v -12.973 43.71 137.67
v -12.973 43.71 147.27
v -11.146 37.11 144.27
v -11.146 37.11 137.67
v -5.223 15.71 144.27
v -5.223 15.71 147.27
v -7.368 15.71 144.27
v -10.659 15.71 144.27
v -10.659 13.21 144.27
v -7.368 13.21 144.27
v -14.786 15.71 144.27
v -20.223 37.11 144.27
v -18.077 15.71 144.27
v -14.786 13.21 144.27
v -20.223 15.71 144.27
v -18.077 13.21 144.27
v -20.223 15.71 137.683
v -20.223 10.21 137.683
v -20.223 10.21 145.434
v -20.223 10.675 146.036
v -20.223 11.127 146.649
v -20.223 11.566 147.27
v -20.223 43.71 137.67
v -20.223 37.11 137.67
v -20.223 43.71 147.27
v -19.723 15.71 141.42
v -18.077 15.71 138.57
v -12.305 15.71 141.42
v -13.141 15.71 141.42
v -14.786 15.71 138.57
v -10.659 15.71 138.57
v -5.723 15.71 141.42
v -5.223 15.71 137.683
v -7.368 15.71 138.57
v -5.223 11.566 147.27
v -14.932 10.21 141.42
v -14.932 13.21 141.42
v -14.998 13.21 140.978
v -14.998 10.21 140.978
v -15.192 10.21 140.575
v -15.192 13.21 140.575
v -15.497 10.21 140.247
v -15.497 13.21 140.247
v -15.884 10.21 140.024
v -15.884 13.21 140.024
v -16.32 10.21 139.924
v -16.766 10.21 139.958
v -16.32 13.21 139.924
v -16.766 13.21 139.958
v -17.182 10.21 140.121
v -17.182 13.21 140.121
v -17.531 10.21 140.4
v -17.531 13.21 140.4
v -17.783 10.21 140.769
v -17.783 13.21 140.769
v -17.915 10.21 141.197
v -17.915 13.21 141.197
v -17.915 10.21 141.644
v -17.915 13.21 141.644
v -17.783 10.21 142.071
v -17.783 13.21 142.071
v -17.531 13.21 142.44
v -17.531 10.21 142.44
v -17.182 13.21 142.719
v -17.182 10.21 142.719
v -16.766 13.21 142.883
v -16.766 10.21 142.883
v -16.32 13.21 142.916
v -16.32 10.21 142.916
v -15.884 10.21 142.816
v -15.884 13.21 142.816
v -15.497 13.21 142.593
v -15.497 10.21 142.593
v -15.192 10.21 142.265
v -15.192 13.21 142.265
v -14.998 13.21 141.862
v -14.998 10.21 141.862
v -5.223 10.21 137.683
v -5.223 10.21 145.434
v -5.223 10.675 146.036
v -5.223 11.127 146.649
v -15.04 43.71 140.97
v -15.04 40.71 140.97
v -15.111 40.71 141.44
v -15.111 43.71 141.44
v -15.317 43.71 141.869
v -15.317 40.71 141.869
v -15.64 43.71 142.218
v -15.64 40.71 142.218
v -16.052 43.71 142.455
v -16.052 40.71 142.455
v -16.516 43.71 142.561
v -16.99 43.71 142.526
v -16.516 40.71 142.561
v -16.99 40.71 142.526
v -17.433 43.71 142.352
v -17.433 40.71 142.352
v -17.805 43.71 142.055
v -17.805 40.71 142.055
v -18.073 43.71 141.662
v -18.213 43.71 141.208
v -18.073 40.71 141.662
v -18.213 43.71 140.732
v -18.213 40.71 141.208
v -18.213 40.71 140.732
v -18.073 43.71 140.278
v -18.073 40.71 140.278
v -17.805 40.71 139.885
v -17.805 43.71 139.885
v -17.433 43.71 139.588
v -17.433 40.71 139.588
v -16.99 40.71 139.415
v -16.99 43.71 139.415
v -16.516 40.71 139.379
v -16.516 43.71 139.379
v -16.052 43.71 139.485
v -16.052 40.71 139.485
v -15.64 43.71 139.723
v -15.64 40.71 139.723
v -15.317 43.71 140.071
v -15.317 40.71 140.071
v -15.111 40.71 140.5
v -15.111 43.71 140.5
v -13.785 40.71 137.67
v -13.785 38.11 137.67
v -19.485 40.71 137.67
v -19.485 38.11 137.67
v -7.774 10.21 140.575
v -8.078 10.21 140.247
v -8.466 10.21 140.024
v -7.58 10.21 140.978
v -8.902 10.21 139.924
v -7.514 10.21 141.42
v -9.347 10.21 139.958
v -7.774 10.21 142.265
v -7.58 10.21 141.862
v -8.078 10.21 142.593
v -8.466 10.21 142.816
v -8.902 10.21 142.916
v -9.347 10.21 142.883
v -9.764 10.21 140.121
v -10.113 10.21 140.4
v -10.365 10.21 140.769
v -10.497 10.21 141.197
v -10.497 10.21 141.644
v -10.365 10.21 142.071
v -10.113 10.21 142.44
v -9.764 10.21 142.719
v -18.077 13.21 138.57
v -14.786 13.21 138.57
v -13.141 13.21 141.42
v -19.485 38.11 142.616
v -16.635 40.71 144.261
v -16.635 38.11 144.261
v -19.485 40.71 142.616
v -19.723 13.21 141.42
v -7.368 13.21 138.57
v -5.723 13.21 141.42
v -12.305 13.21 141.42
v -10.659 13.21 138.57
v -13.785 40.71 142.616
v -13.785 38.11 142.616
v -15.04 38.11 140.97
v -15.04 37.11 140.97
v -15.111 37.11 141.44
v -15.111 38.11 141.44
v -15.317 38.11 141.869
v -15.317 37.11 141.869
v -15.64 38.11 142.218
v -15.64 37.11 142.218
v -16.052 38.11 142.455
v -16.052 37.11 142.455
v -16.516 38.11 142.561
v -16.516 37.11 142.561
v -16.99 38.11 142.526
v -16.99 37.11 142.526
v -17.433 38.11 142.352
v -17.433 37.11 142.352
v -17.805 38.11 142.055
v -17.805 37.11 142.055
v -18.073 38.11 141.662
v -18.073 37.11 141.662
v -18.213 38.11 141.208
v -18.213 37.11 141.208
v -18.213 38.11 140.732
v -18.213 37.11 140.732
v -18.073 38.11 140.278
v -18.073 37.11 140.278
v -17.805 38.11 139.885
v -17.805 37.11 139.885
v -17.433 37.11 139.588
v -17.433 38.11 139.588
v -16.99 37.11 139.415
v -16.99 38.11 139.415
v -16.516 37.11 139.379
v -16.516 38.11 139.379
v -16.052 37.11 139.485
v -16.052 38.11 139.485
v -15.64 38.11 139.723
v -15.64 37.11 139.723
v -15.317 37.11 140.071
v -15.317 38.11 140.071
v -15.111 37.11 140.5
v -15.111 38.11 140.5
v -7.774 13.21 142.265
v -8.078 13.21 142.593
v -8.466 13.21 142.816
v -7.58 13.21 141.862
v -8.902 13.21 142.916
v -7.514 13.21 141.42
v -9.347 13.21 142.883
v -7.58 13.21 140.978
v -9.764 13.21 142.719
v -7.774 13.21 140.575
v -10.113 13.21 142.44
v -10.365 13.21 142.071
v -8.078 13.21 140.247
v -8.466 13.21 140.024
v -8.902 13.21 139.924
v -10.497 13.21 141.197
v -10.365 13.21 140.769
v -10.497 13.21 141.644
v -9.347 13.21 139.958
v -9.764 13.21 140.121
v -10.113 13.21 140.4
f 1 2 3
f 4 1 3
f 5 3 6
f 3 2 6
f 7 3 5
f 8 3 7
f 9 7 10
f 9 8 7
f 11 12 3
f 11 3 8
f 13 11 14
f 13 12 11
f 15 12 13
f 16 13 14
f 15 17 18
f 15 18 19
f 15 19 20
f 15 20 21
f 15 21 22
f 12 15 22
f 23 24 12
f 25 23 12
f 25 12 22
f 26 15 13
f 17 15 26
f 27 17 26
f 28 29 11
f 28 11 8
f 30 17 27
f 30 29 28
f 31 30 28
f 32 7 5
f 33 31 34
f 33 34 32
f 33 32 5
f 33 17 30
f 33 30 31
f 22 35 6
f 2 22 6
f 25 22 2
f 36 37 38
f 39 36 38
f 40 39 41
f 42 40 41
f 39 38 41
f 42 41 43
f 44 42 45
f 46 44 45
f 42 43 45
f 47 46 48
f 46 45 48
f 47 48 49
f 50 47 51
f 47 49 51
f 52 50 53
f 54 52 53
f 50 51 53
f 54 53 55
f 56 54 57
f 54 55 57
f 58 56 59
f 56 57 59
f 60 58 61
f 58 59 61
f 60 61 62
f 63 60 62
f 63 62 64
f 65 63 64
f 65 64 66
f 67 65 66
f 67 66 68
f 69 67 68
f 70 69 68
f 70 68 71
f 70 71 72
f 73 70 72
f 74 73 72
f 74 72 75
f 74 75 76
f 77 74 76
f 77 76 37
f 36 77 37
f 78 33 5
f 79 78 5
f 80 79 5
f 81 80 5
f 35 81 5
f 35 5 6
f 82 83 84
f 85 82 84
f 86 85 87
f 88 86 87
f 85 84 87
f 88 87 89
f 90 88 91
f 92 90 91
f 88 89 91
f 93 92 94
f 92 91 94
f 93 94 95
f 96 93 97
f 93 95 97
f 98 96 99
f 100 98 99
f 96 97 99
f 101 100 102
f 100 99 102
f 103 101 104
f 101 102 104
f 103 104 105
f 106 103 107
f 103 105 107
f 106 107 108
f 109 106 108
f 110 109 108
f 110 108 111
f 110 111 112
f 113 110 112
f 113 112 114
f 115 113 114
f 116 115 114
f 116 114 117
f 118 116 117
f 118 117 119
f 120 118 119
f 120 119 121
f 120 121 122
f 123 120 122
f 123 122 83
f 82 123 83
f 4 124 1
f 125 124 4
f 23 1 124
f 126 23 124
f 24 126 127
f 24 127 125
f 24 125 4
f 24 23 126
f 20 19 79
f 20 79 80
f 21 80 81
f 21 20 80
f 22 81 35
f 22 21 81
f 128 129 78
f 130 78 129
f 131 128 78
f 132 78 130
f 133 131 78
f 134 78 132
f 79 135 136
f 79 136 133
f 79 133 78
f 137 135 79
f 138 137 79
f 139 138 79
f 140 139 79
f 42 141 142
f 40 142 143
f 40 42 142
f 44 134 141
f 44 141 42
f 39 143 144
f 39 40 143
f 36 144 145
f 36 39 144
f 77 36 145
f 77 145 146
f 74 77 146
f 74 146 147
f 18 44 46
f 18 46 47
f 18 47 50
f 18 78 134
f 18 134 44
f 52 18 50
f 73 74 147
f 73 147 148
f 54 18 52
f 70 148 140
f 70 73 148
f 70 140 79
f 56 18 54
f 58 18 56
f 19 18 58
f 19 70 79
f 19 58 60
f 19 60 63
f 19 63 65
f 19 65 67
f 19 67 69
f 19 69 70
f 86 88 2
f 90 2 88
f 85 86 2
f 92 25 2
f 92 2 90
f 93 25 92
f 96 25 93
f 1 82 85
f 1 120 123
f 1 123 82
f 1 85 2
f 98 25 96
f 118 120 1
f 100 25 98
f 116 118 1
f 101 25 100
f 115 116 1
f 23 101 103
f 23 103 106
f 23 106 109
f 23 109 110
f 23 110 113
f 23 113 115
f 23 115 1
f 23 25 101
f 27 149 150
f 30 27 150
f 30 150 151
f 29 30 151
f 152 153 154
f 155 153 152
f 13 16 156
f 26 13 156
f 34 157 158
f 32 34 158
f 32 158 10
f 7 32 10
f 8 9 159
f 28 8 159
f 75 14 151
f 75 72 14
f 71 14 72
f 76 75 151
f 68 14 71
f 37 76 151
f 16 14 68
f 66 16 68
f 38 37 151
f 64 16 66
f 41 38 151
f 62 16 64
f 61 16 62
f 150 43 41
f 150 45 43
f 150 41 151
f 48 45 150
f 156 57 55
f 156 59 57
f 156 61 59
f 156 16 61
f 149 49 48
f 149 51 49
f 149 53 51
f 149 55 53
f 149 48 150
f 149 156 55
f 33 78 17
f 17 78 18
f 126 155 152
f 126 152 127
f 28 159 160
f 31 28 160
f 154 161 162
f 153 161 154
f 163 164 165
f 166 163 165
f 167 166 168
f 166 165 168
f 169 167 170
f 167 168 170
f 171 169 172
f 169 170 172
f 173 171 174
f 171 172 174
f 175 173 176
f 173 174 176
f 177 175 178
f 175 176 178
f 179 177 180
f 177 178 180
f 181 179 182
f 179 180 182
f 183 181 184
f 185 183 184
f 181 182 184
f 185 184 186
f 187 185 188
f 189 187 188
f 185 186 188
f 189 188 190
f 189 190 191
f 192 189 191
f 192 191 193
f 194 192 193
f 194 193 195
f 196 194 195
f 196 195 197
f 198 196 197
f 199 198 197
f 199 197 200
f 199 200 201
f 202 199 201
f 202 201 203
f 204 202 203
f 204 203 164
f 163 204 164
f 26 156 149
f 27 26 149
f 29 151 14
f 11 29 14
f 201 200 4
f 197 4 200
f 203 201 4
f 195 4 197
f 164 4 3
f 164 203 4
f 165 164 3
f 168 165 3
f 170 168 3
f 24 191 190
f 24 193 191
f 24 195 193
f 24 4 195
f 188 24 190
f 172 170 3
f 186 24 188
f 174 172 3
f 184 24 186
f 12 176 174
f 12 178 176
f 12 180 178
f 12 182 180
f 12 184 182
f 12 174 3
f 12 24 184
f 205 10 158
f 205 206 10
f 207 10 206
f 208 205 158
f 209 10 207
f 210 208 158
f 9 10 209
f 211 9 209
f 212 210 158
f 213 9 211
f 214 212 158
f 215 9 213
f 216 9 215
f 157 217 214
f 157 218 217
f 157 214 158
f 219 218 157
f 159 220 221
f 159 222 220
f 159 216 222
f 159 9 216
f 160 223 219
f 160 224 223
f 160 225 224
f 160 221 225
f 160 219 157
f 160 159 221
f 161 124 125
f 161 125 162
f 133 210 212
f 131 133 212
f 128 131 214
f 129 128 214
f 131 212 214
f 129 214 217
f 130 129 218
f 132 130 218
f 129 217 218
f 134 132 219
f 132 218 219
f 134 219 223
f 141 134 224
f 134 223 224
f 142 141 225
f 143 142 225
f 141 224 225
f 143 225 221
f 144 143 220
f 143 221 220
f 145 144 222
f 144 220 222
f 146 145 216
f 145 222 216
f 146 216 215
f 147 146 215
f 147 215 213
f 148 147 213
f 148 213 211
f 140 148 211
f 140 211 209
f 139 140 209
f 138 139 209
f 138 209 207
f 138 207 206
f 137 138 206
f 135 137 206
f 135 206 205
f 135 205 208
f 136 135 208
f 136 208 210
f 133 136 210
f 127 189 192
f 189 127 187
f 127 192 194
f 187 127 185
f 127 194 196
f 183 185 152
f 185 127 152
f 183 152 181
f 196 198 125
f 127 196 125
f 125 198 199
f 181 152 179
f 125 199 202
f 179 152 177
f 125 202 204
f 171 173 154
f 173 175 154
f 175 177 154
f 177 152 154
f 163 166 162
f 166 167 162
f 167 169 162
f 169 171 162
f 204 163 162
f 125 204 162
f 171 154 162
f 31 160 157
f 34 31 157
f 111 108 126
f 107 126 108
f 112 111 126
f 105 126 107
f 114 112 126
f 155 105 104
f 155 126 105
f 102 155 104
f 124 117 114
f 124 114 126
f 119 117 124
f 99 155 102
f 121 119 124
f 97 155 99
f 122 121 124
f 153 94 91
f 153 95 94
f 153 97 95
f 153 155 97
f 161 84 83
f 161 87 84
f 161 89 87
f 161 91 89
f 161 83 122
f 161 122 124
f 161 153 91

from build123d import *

# Parameters (mm, degrees)
BOSS_EXTRUDE1_DEPTH  = 15
CUT_EXTRUDE2_REACH   = 8.6
SKETCH3_R            = 1.595559434
CUT_EXTRUDE5_START   = -3.6
SKETCH3_6_R          = 1.595559434
CUT_EXTRUDE5_DEPTH   = 2.6
CUT_EXTRUDE3_REACH   = 5
SKETCH4_R            = 1.5
BOSS_EXTRUDE10_DEPTH = 2.5
CUT_EXTRUDE1_DEPTH   = 10.6


with BuildPart() as part:
    # Sketch1 → Boss-Extrude1 (new body)
    with BuildSketch(Plane.ZY.offset(20.222709888)):
        with BuildLine():
            Line((144.27017666, 37.109962519), (144.27017666, 13.209962519))
            Line((144.27017666, 13.209962519), (137.68267666, 13.209962519))
            Line((137.68267666, 13.209962519), (137.68267666, 10.209962519))
            Line((137.68267666, 10.209962519), (145.433552955, 10.209962519))
            ThreePointArc((145.433552955, 10.209962519), (146.341426982, 10.902339978), (147.27017666, 11.566452794))
            Line((147.27017666, 11.566452794), (147.27017666, 43.709962519))
            Line((147.27017666, 43.709962519), (137.67017666, 43.709962519))
            Line((137.67017666, 43.709962519), (137.67017666, 37.109962519))
            Line((137.67017666, 37.109962519), (144.27017666, 37.109962519))
        make_face()
    extrude(amount=-BOSS_EXTRUDE1_DEPTH)

    # Sketch3 → Cut-Extrude2 (cut, up to next)
    with BuildSketch(Plane.XZ.offset(-37.109962519), mode=Mode.PRIVATE) as cut_extrude2_sk1:
        with Locations((-16.635209888, 140.97017666)):
            Circle(SKETCH3_R)
    cut_extrude2_tool1 = extrude(cut_extrude2_sk1.sketch, amount=-CUT_EXTRUDE2_REACH, mode=Mode.PRIVATE) & part.part
    add(cut_extrude2_tool1.solids().sort_by_distance((-16.63521, 37.109963, 140.970177))[0], mode=Mode.SUBTRACT)

    # Sketch3<6> → Cut-Extrude5 (cut)
    with BuildSketch(Plane.XZ.offset(-37.109962519).offset(CUT_EXTRUDE5_START)):
        Polygon((-19.485209888, 139.324728393), (-16.635209888, 137.679280126), (-13.785209888, 139.324728393), (-13.785209888, 142.615624927), (-16.635209888, 144.261073195), (-19.485209888, 142.615624927), align=None)
        with Locations((-16.635209888, 140.97017666)):
            Circle(SKETCH3_6_R, mode=Mode.SUBTRACT)
        Polygon((-13.785209888, 139.324728393), (-16.635209888, 137.679280126), (-19.485209888, 139.324728393), (-19.485209888, 137.67017666), (-13.785209888, 137.67017666), align=None)
        with Locations((-16.635209888, 140.97017666)):
            Circle(SKETCH3_6_R)
    extrude(amount=CUT_EXTRUDE5_DEPTH, mode=Mode.SUBTRACT)

    # Sketch4 → Cut-Extrude3 (cut, up to next)
    with BuildSketch(Plane(origin=(0, 13.209962519, 0), x_dir=(1, 0, 0), z_dir=(0, 1, 0)), mode=Mode.PRIVATE) as cut_extrude3_sk1:
        with Locations((-16.431813353, -141.42017666)):
            Circle(SKETCH4_R)
    cut_extrude3_tool1 = extrude(cut_extrude3_sk1.sketch, amount=-CUT_EXTRUDE3_REACH, mode=Mode.PRIVATE) & part.part
    add(cut_extrude3_tool1.solids().sort_by_distance((-16.431813, 13.209963, 141.420177))[0], mode=Mode.SUBTRACT)
    # Sketch4 → Cut-Extrude3 (cut, up to next)
    with BuildSketch(Plane(origin=(0, 13.209962519, 0), x_dir=(1, 0, 0), z_dir=(0, 1, 0)), mode=Mode.PRIVATE) as cut_extrude3_sk2:
        with Locations((-9.013606422, -141.42017666)):
            Circle(SKETCH4_R)
    cut_extrude3_tool2 = extrude(cut_extrude3_sk2.sketch, amount=-CUT_EXTRUDE3_REACH, mode=Mode.PRIVATE) & part.part
    add(cut_extrude3_tool2.solids().sort_by_distance((-9.013606, 13.209963, 141.420177))[0], mode=Mode.SUBTRACT)

    # Sketch11 → Boss-Extrude10 (add)
    with BuildSketch(Plane(origin=(0, 13.209962519, 0), x_dir=(1, 0, 0), z_dir=(0, 1, 0))):
        Polygon((-18.077261621, -144.27017666), (-19.722709888, -141.42017666), (-18.077261621, -138.57017666), (-14.786365086, -138.57017666), (-13.140916819, -141.42017666), (-14.786365086, -144.27017666), (-10.659054689, -144.27017666), (-12.304502957, -141.42017666), (-10.659054689, -138.57017666), (-7.368158155, -138.57017666), (-5.722709888, -141.42017666), (-7.368158155, -144.27017666), (-5.222709888, -144.27017666), (-5.222709888, -137.68267666), (-20.222709888, -137.68267666), (-20.222709888, -144.27017666), align=None)
    extrude(amount=BOSS_EXTRUDE10_DEPTH)

    # Sketch2 → Cut-Extrude1 (cut, through all)
    with BuildSketch(Plane.XY.offset(147.27017666)):
        Polygon((-12.972709888, 43.709962519), (-5.222709888, 15.709962519), (-5.222709888, 43.709962519), align=None)
    extrude(amount=-CUT_EXTRUDE1_DEPTH, mode=Mode.SUBTRACT)


solid = part.part
